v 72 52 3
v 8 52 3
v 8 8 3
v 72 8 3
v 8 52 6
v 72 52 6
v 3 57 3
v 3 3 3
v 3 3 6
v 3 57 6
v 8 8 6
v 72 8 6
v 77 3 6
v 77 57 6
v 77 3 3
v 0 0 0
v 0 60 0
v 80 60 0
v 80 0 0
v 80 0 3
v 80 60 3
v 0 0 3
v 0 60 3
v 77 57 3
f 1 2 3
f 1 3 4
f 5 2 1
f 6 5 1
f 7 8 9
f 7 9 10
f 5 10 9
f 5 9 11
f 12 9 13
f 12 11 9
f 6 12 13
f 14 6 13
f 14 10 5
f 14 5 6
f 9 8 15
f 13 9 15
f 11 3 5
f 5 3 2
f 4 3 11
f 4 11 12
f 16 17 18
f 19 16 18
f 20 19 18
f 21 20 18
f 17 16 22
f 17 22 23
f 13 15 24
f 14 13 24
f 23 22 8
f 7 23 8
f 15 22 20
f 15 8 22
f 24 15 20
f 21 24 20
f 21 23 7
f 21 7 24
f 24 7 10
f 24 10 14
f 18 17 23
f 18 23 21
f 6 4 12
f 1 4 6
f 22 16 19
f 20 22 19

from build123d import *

# Parameters (mm, degrees)
F0_W     = 64
F0_H     = 44
F1_DEPTH = 3
F0_W_2   = 80
F0_H_2   = 60
F0_W_3   = 74
F0_H_3   = 54
F2_DEPTH = 6


with BuildPart() as f1:
    # F0 (on Top) → F1 (new body)
    with BuildSketch(Plane.XY):
        with Locations((40, 30)):
            Rectangle(F0_W, F0_H)
    extrude(amount=F1_DEPTH)



with BuildPart() as f1b:
    # F0 (on Top) → F1, piece 2 (new body)
    with BuildSketch(Plane.XY):
        with Locations((40, 30)):
            Rectangle(F0_W_2, F0_H_2)
        with Locations((40, 30)):
            Rectangle(F0_W_3, F0_H_3, mode=Mode.SUBTRACT)
    extrude(amount=F1_DEPTH)


with BuildPart() as f1_1:
    add(f1.part)

    add(f1b.part)  # F2 merges F1b
    # F0 (on Top) → F2 (join)
    with BuildSketch(Plane.XY):
        with Locations((40, 30)):
            Rectangle(F0_W_3, F0_H_3)
        with Locations((40, 30)):
            Rectangle(F0_W, F0_H, mode=Mode.SUBTRACT)
    extrude(amount=F2_DEPTH)


solid = f1_1.part
